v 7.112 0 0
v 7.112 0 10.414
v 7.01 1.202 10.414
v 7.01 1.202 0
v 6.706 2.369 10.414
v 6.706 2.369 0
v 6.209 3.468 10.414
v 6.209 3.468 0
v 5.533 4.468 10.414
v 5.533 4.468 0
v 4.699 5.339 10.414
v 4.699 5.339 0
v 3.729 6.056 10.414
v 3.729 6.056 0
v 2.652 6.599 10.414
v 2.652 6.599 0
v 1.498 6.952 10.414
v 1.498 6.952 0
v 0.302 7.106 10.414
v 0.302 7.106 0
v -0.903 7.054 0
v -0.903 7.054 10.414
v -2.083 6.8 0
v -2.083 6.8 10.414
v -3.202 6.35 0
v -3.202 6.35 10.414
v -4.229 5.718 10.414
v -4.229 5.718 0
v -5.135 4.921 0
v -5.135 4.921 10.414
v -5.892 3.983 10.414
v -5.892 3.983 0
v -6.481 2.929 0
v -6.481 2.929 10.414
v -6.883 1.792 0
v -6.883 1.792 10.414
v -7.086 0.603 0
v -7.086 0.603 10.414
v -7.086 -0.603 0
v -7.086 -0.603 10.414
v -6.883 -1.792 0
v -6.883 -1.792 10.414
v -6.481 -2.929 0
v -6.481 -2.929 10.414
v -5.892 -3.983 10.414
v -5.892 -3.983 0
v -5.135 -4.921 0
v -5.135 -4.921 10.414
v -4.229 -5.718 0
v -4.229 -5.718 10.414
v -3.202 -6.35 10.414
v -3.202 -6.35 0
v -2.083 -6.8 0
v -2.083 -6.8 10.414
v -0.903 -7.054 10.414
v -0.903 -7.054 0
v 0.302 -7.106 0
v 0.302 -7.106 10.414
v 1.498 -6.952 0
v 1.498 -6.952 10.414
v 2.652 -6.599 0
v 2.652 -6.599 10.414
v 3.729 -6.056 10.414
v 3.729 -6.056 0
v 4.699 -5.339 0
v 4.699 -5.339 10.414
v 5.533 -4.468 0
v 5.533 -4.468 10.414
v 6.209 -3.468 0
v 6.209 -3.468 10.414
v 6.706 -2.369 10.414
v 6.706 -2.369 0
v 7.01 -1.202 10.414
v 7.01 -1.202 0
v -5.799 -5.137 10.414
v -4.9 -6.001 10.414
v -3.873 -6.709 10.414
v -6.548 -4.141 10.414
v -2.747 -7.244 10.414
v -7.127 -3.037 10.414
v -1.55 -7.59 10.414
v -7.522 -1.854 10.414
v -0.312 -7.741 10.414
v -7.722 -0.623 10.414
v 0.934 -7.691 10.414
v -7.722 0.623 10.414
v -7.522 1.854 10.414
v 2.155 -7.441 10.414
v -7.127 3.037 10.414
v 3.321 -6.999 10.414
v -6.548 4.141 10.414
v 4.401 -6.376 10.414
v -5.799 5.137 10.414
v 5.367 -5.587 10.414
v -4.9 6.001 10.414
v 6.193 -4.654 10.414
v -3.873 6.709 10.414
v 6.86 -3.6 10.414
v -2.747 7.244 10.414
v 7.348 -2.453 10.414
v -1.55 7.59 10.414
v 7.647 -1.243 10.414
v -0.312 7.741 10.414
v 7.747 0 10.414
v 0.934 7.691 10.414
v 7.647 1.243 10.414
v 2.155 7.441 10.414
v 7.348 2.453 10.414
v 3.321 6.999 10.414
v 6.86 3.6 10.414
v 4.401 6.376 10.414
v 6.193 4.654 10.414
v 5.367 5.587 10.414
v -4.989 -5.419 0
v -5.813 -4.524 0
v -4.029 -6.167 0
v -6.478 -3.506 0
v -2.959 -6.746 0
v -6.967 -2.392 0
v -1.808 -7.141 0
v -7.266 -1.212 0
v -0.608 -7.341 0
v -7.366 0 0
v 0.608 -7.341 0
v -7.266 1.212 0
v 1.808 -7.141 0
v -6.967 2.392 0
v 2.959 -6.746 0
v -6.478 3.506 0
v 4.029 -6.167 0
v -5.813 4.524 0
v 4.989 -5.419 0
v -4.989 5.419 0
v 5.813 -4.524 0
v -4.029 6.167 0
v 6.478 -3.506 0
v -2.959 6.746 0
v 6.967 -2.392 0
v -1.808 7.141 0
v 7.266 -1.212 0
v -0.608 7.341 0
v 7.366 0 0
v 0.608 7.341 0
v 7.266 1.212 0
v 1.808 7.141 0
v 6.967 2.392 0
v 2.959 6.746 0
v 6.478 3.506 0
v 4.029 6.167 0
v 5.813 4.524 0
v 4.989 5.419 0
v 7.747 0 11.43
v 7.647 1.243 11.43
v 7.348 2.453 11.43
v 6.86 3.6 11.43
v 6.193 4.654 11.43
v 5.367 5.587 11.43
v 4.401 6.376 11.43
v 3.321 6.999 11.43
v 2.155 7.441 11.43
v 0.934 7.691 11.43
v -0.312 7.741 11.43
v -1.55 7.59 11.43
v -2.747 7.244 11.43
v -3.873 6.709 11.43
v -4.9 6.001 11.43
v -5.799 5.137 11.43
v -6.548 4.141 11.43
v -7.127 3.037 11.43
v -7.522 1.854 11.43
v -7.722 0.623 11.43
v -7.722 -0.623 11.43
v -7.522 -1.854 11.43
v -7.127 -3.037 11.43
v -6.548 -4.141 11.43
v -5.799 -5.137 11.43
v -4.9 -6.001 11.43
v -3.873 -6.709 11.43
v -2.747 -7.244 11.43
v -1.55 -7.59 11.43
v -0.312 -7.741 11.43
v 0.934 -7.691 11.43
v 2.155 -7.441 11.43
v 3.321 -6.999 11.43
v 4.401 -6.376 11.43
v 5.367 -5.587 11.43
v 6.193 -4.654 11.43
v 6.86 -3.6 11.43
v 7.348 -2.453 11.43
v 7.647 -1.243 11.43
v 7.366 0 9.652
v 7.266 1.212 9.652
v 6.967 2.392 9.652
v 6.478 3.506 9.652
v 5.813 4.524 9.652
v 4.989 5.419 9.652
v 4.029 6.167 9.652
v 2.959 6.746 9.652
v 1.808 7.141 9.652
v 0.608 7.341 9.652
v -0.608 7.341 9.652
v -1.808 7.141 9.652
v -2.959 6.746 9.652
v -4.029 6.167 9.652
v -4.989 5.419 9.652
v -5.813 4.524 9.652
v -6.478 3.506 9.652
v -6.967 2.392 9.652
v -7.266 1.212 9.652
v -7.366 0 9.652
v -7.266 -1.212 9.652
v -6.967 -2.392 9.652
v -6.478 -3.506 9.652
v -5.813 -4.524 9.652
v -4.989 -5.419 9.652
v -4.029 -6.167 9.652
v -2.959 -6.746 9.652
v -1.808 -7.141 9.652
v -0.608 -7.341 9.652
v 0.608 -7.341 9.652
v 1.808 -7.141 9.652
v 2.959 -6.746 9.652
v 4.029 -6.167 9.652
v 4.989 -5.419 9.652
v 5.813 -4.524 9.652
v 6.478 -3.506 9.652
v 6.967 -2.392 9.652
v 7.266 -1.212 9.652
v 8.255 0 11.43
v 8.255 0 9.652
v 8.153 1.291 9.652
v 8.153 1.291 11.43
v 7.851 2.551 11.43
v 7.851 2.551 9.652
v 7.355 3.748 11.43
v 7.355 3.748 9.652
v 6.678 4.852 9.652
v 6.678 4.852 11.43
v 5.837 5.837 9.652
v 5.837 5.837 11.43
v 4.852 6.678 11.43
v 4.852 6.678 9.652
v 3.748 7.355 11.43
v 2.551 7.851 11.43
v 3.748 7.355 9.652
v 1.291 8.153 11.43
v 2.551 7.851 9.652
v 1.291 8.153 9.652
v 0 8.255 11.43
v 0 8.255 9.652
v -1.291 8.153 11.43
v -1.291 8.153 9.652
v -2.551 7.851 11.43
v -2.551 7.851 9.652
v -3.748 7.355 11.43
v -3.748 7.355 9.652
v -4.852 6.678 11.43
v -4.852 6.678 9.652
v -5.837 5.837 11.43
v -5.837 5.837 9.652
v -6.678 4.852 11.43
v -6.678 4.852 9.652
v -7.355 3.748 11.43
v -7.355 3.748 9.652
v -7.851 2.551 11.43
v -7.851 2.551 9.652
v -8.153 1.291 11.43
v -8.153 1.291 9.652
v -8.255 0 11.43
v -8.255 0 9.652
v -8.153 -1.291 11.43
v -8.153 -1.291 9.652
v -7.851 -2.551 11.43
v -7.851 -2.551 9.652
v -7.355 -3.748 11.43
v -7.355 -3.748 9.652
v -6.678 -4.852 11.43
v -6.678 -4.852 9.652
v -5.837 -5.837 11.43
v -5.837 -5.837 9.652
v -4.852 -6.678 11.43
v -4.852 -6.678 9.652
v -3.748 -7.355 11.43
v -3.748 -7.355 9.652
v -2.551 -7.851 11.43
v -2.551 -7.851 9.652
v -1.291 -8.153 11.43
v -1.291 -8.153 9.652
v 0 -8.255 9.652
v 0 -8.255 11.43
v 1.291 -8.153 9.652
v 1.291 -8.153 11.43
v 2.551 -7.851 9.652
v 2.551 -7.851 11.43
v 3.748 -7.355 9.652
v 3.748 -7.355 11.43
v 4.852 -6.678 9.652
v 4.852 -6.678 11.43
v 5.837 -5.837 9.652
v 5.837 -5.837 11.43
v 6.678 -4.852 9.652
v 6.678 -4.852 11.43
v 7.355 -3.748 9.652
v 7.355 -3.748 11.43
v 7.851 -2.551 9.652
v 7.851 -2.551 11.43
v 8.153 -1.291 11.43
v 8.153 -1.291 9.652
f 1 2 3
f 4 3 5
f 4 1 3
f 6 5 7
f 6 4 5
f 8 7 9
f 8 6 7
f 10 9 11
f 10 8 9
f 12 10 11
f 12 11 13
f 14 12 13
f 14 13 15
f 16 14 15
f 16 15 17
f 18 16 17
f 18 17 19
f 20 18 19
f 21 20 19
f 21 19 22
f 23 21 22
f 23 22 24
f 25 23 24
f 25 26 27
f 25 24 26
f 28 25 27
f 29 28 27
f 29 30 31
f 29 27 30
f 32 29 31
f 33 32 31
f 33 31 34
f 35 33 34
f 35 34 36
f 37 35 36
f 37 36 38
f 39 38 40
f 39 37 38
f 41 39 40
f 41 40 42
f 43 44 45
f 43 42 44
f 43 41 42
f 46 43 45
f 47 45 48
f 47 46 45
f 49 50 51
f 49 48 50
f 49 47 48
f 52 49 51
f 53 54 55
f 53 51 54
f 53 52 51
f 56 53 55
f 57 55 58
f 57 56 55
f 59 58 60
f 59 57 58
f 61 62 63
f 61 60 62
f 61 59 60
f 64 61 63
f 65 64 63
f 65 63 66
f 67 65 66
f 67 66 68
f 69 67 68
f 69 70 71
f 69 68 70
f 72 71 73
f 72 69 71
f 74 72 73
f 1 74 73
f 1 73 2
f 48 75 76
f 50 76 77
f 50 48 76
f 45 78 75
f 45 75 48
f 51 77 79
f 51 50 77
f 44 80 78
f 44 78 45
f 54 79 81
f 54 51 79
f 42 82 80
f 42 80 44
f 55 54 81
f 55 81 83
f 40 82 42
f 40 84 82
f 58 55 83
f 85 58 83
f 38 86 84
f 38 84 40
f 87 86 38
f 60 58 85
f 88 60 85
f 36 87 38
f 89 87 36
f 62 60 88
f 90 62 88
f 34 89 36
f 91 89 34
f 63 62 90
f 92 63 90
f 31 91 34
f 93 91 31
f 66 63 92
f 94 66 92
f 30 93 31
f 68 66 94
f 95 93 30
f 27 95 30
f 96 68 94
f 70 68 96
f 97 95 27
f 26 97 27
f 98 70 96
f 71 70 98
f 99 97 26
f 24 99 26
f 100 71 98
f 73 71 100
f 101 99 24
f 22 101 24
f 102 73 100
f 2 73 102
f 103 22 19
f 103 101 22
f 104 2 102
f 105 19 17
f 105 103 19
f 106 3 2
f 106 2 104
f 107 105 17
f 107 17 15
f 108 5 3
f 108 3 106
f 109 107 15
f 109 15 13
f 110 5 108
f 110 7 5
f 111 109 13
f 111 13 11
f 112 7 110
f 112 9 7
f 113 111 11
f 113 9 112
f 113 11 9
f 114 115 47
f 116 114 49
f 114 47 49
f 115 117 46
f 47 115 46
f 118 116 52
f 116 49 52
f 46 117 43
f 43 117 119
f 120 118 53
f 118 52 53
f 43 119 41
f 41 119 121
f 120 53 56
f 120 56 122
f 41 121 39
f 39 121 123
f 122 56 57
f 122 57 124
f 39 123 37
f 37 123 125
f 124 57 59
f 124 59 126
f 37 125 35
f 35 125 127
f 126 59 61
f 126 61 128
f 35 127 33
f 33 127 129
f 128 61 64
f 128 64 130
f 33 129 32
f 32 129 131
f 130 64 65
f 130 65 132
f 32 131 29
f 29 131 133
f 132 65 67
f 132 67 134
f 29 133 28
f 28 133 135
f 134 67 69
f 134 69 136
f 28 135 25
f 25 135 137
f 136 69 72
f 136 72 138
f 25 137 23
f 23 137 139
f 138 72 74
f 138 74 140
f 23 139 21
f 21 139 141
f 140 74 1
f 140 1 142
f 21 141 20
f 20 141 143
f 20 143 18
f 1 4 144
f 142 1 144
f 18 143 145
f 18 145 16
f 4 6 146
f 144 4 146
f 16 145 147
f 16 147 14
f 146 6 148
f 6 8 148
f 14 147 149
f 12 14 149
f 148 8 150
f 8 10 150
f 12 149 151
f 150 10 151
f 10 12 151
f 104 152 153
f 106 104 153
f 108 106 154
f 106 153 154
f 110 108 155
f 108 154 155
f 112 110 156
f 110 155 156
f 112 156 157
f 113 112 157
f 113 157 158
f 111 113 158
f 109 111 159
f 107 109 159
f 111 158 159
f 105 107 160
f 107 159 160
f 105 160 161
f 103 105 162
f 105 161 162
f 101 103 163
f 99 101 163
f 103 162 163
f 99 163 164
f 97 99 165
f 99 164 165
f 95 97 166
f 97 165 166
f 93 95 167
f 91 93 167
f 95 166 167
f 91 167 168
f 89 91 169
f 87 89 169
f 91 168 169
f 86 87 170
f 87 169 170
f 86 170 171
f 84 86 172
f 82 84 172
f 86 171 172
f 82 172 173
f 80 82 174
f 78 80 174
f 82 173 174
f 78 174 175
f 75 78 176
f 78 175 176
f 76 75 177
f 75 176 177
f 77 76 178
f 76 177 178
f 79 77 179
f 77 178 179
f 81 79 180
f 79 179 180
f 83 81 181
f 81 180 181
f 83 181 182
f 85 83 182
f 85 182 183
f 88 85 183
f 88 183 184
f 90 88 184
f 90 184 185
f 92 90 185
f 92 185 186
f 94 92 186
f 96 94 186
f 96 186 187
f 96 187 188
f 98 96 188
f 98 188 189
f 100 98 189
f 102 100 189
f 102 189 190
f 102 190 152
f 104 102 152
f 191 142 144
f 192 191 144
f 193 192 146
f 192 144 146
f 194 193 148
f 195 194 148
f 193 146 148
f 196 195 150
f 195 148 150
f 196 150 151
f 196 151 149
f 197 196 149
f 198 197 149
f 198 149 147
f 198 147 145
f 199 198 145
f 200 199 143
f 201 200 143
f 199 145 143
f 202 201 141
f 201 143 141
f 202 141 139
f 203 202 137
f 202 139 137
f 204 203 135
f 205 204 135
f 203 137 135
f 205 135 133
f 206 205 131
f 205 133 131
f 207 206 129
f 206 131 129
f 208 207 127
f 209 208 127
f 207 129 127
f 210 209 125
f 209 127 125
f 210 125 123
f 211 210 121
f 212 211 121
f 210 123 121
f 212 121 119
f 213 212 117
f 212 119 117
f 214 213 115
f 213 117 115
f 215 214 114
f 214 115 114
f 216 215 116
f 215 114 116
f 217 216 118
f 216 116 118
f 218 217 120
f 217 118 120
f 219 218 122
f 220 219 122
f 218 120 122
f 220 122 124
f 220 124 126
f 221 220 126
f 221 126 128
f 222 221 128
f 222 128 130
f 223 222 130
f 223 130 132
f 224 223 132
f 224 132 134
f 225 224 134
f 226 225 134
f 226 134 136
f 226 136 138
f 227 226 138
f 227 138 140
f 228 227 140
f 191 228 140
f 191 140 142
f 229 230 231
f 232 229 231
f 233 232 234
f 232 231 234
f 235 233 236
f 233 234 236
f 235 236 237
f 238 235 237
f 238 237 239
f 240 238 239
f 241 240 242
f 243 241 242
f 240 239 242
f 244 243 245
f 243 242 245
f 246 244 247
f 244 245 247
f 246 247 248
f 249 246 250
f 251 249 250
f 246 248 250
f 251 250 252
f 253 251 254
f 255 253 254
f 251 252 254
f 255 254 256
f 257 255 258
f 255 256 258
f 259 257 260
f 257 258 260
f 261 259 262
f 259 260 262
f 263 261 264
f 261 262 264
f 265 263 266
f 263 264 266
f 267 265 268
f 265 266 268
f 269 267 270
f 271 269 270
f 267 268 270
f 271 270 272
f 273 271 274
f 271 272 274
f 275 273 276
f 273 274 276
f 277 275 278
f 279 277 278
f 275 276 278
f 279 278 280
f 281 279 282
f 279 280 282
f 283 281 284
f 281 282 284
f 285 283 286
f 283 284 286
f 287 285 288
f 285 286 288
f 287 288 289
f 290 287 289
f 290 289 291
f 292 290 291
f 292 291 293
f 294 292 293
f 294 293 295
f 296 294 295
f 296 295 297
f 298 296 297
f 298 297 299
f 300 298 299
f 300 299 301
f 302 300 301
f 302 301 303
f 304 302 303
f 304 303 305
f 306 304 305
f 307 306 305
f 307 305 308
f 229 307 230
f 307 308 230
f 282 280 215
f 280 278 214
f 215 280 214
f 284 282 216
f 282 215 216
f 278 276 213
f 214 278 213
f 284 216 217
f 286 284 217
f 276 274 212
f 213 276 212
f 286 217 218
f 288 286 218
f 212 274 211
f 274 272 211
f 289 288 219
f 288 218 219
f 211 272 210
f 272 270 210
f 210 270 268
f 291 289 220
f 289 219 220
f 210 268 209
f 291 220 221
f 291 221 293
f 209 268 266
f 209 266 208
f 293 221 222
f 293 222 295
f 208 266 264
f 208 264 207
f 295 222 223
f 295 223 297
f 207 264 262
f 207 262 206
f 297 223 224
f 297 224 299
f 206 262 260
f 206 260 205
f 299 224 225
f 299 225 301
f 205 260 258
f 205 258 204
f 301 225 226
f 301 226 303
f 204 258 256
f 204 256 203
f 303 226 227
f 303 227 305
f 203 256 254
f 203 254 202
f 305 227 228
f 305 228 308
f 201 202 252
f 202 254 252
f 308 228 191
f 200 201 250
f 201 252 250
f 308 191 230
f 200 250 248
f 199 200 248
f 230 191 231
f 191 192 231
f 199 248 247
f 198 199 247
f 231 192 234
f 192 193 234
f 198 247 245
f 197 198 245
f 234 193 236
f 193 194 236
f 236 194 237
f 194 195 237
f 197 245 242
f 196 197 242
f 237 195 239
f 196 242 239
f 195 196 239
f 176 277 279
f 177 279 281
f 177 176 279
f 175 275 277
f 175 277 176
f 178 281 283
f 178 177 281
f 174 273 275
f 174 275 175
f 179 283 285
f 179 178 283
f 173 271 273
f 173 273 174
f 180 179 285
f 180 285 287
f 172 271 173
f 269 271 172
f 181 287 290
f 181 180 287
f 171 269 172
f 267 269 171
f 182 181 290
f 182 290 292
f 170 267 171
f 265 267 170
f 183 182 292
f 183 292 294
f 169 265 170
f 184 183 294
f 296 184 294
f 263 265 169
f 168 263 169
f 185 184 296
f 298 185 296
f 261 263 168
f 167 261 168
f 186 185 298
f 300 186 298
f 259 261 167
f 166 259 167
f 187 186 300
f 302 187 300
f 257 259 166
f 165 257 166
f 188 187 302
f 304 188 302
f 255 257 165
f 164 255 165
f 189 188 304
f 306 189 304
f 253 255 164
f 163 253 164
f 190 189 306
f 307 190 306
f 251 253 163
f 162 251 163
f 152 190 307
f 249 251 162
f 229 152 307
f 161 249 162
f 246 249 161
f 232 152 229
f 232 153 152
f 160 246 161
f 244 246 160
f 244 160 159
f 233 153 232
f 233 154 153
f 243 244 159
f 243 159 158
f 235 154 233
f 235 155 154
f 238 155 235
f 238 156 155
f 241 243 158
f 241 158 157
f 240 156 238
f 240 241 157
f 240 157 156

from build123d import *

# Parameters (mm, degrees)
F1_R     = 7.366
F2_DEPTH = 9.652
F3_R     = 8.255
F4_DEPTH = 1.778
F5_R     = 7.747
F6_DEPTH = 1.016
F0_R     = 7.112
F7_DEPTH = 19.304


with BuildPart() as f2:
    # F1 (on Top) → F2 (new body)
    with BuildSketch(Plane.XY):
        Circle(F1_R)
    extrude(amount=F2_DEPTH)

    # F3 (on face) → F4 (join)
    with BuildSketch(Plane.XY.offset(9.652)):
        Circle(F3_R)
    extrude(amount=F4_DEPTH)

    # F5 (on face) → F6 (cut)
    with BuildSketch(Plane.XY.offset(11.43)):
        Circle(F5_R)
    extrude(amount=-F6_DEPTH, mode=Mode.SUBTRACT)

    # F0 (on Top) → F7 (cut)
    with BuildSketch(Plane.XY):
        Circle(F0_R)
    extrude(amount=F7_DEPTH, mode=Mode.SUBTRACT)


solid = f2.part
